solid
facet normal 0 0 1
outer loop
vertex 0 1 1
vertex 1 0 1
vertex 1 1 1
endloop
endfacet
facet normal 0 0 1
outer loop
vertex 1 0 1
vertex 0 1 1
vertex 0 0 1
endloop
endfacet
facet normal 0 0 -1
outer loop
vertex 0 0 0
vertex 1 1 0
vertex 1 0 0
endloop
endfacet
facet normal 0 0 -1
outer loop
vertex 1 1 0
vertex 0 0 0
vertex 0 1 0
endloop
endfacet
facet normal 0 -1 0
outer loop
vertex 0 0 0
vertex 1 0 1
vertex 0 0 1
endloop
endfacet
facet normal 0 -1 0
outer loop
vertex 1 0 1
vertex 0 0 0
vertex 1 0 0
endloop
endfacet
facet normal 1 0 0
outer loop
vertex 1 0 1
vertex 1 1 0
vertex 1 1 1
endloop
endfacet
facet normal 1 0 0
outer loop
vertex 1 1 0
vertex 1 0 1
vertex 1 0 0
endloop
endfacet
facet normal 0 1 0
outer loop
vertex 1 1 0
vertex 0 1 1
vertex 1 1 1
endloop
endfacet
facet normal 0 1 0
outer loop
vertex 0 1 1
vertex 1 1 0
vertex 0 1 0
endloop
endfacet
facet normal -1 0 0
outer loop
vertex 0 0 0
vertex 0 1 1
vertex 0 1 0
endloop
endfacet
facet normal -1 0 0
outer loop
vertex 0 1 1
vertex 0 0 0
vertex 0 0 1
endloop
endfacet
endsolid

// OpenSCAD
// file: ../util.scad
//=============================================================================
// Common utilities for lock models
//=============================================================================

// Resolution defaults

$fs = 0.1;
$fa = 1;

eps = 1e-3;

//-----------------------------------------------------------------------------
// Extruding
//-----------------------------------------------------------------------------

module linear_extrude_y(height,center=false,convexity=4) {
  translate([0,center?0:height,0])
  rotate([90,0,0])
  linear_extrude(height=height,center=center,convexity=convexity) children();
}
module linear_extrude_x(height,center=false,convexity=4) {
  rotate([0,0,90])
  linear_extrude_y(height=height,center=center,convexity=convexity) children();
}

//-----------------------------------------------------------------------------
// Chamfering
//-----------------------------------------------------------------------------

module fillet(r) {
  offset(r=r) offset(delta=-r) children();
}

module chamfer_rect(w,h,r) {
  polygon([
    [-w/2+r,-h/2],
    [-w/2,-h/2+r],
    [-w/2,h/2-r],
    [-w/2+r,h/2],
    [w/2-r,h/2],
    [w/2,h/2-r],
    [w/2,-h/2+r],
    [w/2-r,-h/2],
  ]);
}

module octahedron(r) {
  union() {
    cylinder(r1=r,r2=0,h=r,$fn=4);
    mirror([0,0,1]) cylinder(r1=r,r2=0,h=r,$fn=4);
  }
}

module chamfer_cube(x,y,z,r) {
  minkowski() {
    cube([x-2*r,y-2*r,z-2*r],center=true);
    octahedron(r,center=true);
  }
}

module minkowski_difference(size=1e12) {
  difference() {
    cube(size*[1.1,1.1,1.1], center=true);
    minkowski(){
      difference(){
        cube(size*[1,1,1], center=true);
        children(0);
      }
      children(1);
    }
  }
}

//-----------------------------------------------------------------------------
// Primitives
//-----------------------------------------------------------------------------

function mul_vec(a,b) = [for (i=[0:len(a)-1]) a[i]*b[i]];
function reverse(list) = [for (i=[0:len(list)-1]) list[len(list)-i-1]];
function mul_vecs(a,list) = [for (x=list) mul_vec(a,x)];
function palindrome(mul, list) = concat(list, mul_vecs(mul,reverse(list)));
module sym_polygon(mul,list) {
  polygon(palindrome(mul,list));
}
// a polygon that is symmetric in the y direction
module sym_polygon_y(list) sym_polygon([1,-1],list);
module sym_polygon_x(list) sym_polygon([-1,1],list);
module sym_polygon_xy(list) {
  polygon(concat(
    list,
    mul_vecs([1,-1],reverse(list)),
    mul_vecs([-1,-1],list),
    mul_vecs([-1,1],reverse(list))
  ));
}
module sym_polygon_180(list) {
  polygon(concat(list,mul_vecs([-1,-1],list)));
}

//-----------------------------------------------------------------------------
// Halfspaces
//-----------------------------------------------------------------------------

lots = 1e3;
module positive_x() { translate([lots,0,0]) cube(2*lots,true); }
module positive_y() { translate([0,lots,0]) cube(2*lots,true); }
module positive_z() { translate([0,0,lots]) cube(2*lots,true); }
module negative_x() { translate([-lots,0,0]) cube(2*lots,true); }
module negative_y() { translate([0,-lots,0]) cube(2*lots,true); }
module negative_z() { translate([0,0,-lots]) cube(2*lots,true); }
module everything() { cube(2*lots,true); }
module not() { difference() { group() {children();} everything(); }  }

//-----------------------------------------------------------------------------
// Other construction utilities
//-----------------------------------------------------------------------------

module translate_x(d) { translate([d,0,0]) children(); }
module translate_y(d) { translate([0,d,0]) children(); }
module translate_z(d) { translate([0,0,d]) children(); }

module translates(ps) {
  for (p=ps) translate(p) children();
}

module mirrored(a) {
  children();
  mirror(a) children();
}

//-----------------------------------------------------------------------------
// Threads
//-----------------------------------------------------------------------------

module m3_thread(length,internal=false) metric_thread(diameter=3,pitch=0.5,length=length,internal=internal);
module m4_thread(length,internal=false) metric_thread(diameter=4,pitch=0.7,length=length,internal=internal);

//-----------------------------------------------------------------------------
// Twisting
//-----------------------------------------------------------------------------
// main file
//=============================================================================
// Waverlock: a wavy waferlock
// by Twan van Laarhoven
//=============================================================================

include <../util.scad>

//-----------------------------------------------------------------------------
// Model parameters
//-----------------------------------------------------------------------------

//bitting = [-2,-3,-1,1,3,3,2];
bitting = [-2,-3,-1,-3,-1,1,3,3,2];
//bitting = [-2,-3,-1,1,3,3,1,-1,-3,1];
//bitting = [-2,-3,-2,-1,1,3,3,2,0,-2];
echo("key bitting", bitting);

eps = 0.01;
C = 0.125; // clearance
CX = 0.125; // clearance in x and y directions
tightC = 0.08;
bridgeC = 0.5; // clearance for bridges

coreR = 9;

//wafers = 12;
wafers = len(bitting);
echo("nr wafers", wafers);
waferThickness = 2;
waferThicknessLast = 4;
waferStep = waferThickness+C;
waferWidth = 10;
waferLip = 0.6;
tabWidth = 8;
tabSlope = 0.3;

faceR = coreR+1;
faceThickness = 2;
faceCountersink = 1;

keyWidth = 7;
keyDelta = 2;
keyHeight = 1.8;

toothSlope = 1;
keyC = C + 0.05; // vertical clearance in keyhole
keyCX = 0.2; // horizontal clearance in keyhole (not critical)
keyHolePos = 0;

connectorR=1.25;
connectorPos=0;
connectorLen=6;
pinC = 0.2; // it is critical that there is enough clearance, better to have too much
pinCX = 0.05; // clearance in movement direction

step = 0.8;
//step = 0.8;
//step = 1.0;
//minBit = -6; maxBit = 6;
//minBit = -4; maxBit = 4;
minBit = -3; maxBit = 3;
//minBit = -2; maxBit = 4;
//minBit = -1; maxBit = 5;
//minBit = 0; maxBit = 6;
bits = maxBit-minBit+1;
//maxDelta = 3*step;
maxDelta = 1.6;

tabC = 0.4; // Clearance on side of tabs
tabCtwist = 3; // extra clearance on back wafers
tabCY = 2*C; // Clearance above tabs
tabR = coreR + (bits-1)*step + tabCY;

coreBack = 2;
clipSep = 0.8;
coreBackOverlap = 1;
coreStackHeight = wafers * waferStep + waferThicknessLast + bridgeC - coreBackOverlap;

echo ("bit difference",bits*step);
waferSpace=bits*step + 0.5;
housingRX = coreR + 4;
housingRY = coreR + 1.7 + waferSpace;
housingChamfer = 1;
coreHeight = faceCountersink + coreStackHeight;
housingDepth = coreHeight + coreBack + clipSep;
echo ("housing",2*housingRX,2*housingRY,housingDepth);

housingChamfer2 = housingChamfer*0.5; // chamfer inside cap
capEdge = 1.6;
capCountersink = 1.6;
capDepth = capEdge+capCountersink+1+6;
capClip = 1;
capClipLength = 10;

clipR = housingRX-capEdge-(C+tightC); // better a bit extra play here
clipW = 8;
clipCoreR = coreR-2;
clipCoreC = 0.05;
clipH = 4.4;

//-----------------------------------------------------------------------------
// Keyway
//-----------------------------------------------------------------------------

module key_profile(delta=0) {
  dx=2*delta*keyDelta/keyWidth;
  dy=delta;
  linear_extrude(height=eps,convexity=106) {
    rotate(90)
    polygon([
      [-keyDelta/2-dx,-keyWidth/2-dy],
      [keyDelta/2,0],
      [-keyDelta/2-dx,keyWidth/2+dy],
      [-keyDelta/2-dx+eps,keyWidth/2+dy],
      [keyDelta/2+eps,0],
      [-keyDelta/2-dx+eps,-keyWidth/2-dy]
    ]);
  }
}
module extrude_key(delta=0) {
  minkowski() {
    linear_extrude_x(eps) children();
    key_profile(delta);
  }
}
module key_hole(delta=keyCX) {
  l=0;
  extrude_key(delta=delta) {
    sym_polygon_x([
      [keyHeight/2+keyC+toothSlope*(1+l), -l],
      [keyHeight/2+keyC+toothSlope*0,    1],
      [keyHeight/2+keyC+toothSlope*0,    1.5],
      [keyHeight/2+keyC+toothSlope*0.5,  2],
    ]);
  }
}
module last_key_hole(delta=keyCX) {
  l = 10; r = 10;
  extrude_key(delta=delta) {
    sym_polygon_x([
      [keyHeight/2+keyC+toothSlope*l, -l],
      [keyHeight/2+keyC+toothSlope*0, 0],
      [keyHeight/2+keyC+toothSlope*0, r],
    ]);
  }
}
//!key_hole();

//-----------------------------------------------------------------------------
// Key
//-----------------------------------------------------------------------------

module key_shape() {
  ebitting = concat([0],bitting,[0]);
  n = len(ebitting);
  point = 0.3;
  flat = 0.2;
  coflat = 0.1;
  end = (n-1)*waferStep + waferThicknessLast - 0.5;
  top = concat(
    [[-keyHeight/2, 0]],
    [for (i=[0:n-1]) for (j=[0,1])
      [ebitting[i]*step - keyHeight/2, i*waferStep +
        (j==0 ? ((i>0   && ebitting[i-1]<ebitting[i]) ? 1-flat : 1+coflat)
              : ((i+1<n && ebitting[i+1]<ebitting[i]) ? 1.5+flat : 1.5-coflat))]
    ],
    [[-keyHeight/2, end - (keyHeight-point)/2]
    ,[-point/2, end]]
  );
  bot = concat(
    [[keyHeight/2, 0]],
    [for (i=[0:n-1]) for (j=[0,1])
      [ebitting[i]*step + keyHeight/2, i*waferStep +
        (j==0 ? ((i>0   && ebitting[i-1]>ebitting[i]) ? 1-flat : 1+coflat)
              : ((i+1<n && ebitting[i+1]>ebitting[i]) ? 1.5+flat : 1.5-coflat))]
    ],
    [[keyHeight/2, end - (keyHeight-point)/2]
    ,[point/2, end]]
  );
  polygon(concat(top,reverse(bot)));
}
module key() {
  end = (len(bitting)+1)*waferStep + waferThicknessLast - 0.5;
  chamfer = 0.7;
  group() {
    intersection() {
      extrude_key() {
        key_shape();
      }
      linear_extrude_y(lots,true) {
        sym_polygon_x([[-keyWidth,-10], [-keyWidth,end-chamfer], [-keyWidth/2,end-chamfer], [-keyWidth/2+chamfer,end]]);
      }
    }
    extrude_key() {
      polygon([[-keyHeight/2,0],[keyHeight/2,0],[0,-4]]);
      //translate([-keyHeight/2,-2]) square([keyHeight,2]);
    }
    linear_extrude_y(2,true) {
      difference() {
        translate([0,-16/2]) chamfer_rect(16,16,4);
        translate([0,-16/2-4]) chamfer_rect(5,5,2.5);
      }
    }
  }
}
//!key();

module key_stack(color = "darkred", offset=0) {
  translate_y(1) color(color) linear_extrude_x(1,true) key_shape();
  //color(color) key();
  n = len(bitting);
  translate_z(offset+C)
  intersection() {
    group() {
      first_wafer();
      for (i=[0:n-1]) {
        a = offset/waferStep;
        p = (1-a)*bitting[i] + a*(i==n-1 ? 0 : bitting[i+1]);
        translate([0,(p-bitting[i])*step,faceThickness + i*waferStep])
        if (i==0) {
          wafer(bitting[i]);
        } else {
          wafer(bitting[i]);
        }
      }
      translate_z(faceThickness + n*waferStep) last_wafer();
    }
    negative_x();
  }
}
module key_stacks() {
  key_stack();
  translate_y(coreR*2+8) key_stack(color="darkblue",offset=waferStep*0.5);
}

//!key_stacks();

//-----------------------------------------------------------------------------
// Wafer connector pins
//-----------------------------------------------------------------------------

//module connector_halfpin(C=0) cylinder(r=3+C,h=1);
//module connector_halfpin(C=0) cube([2+2*C,6+2*C,2],true);
module connector_halfpin(C=0,CX=0,dh=0) {
  a = 1.2;
  h = 1.2-dh;
  linear_extrude_y(connectorLen+2*CX,true) {
    //sym_polygon_x([[-a-C, 0], [-a-C+h,h]]);
    sym_polygon_x([[-a-C, 0], [-a+h,h+C]]);
  }
}

module connector_pin(C=0) {
  if (false) {
    union() {
      cylinder(r=connectorR+C,h=1-0.2);
      cylinder(r1=connectorR+0.2+C,r2=connectorR+C,h=0.2);
      translate([0,0,1-0.2]) cylinder(r1=connectorR+C,r2=connectorR-0.2+C,h=0.2);
    }
  } else {
    group() {
      translate([0,coreR,0]) connector_halfpin(dh=0.2);
      translate([0,-coreR,0]) connector_halfpin(dh=0.2);
    }
  }
}

module connector_slot(bit=3) {
  a = -maxDelta;
  b = maxDelta;
  if (true) {
    group() {
      hull() {
        translate([0,coreR+a,0]) connector_halfpin(pinC,CX=pinCX);
        translate([0,coreR+b,0]) connector_halfpin(pinC,CX=pinCX);
      }
      hull() {
        translate([0,-coreR+a,0]) connector_halfpin(pinC,CX=pinCX);
        translate([0,-coreR+b,0]) connector_halfpin(pinC,CX=pinCX);
      }
    }
  } else {
    hull() {
      translate([0,a,0]) cylinder(r=connectorR+C,h=1);
      translate([0,b,0]) cylinder(r=connectorR+C,h=1);
    }
    hull() {
      translate([0,a,0]) cylinder(r1=connectorR+0.2+C,r2=connectorR+C,h=0.2);
      translate([0,b,0]) cylinder(r1=connectorR+0.2+C,r2=connectorR+C,h=0.2);
    }
  }
}

//-----------------------------------------------------------------------------
// Wafers
//-----------------------------------------------------------------------------

module wafer_profile(C=0,CX=0) {
  a = waferLip + 2*C;
  b = a + waferLip;
  linear_extrude_y(coreR*2+eps,center=true,convexity=2)
  sym_polygon_x([
    [-waferWidth/2-CX-waferLip,0],
    [-waferWidth/2-CX-waferLip,a],
    [-waferWidth/2-CX,b],
    [-waferWidth/2-CX,waferThickness+C]
  ]);
}
module last_wafer_profile(C=0,CX=0,bridgeC=0) {
  thickness = waferThicknessLast;
  a = waferLip + 2*C;
  w = thickness+C-a-waferLip;
  linear_extrude_y(coreR*2+eps,center=true,convexity=2)
  sym_polygon_x([
    [-waferWidth/2-CX-waferLip,0],
    [-waferWidth/2-CX-waferLip,a],
    [-waferWidth/2-CX+w+bridgeC,thickness+C+bridgeC]
  ]);
}

module wafer_profiles(C=C,CX=CX) {
  for (i = [0:wafers-1]) {
    translate([0,0,i*waferStep]) {
      wafer_profile(C+eps,CX=CX);
    }
  }
  translate([0,0,wafers*waferStep]) {
    last_wafer_profile(C+eps,CX=CX,bridgeC=bridgeC);
  }
}
module tab_profile(width=tabWidth,height=2*coreR) {
  x = width/2 - tabSlope*height/2;
  polygon([
    [-width/2,-height/2],
    [-x,0],
    [-width/2,height/2],
    [width/2,height/2],
    [x,0],
    [width/2,-height/2],
  ]);
}
//!linear_extrude(waferThickness,true) tab_profile();
//connectorR=2;connectorO=[0,0,-0.5];

module wafer(bit, minBit=minBit, maxBit=maxBit, slot=true, pin=true, tabs=true) {
  y = bit*step;
  thickness = waferThickness;
  difference() {
    union() {
      // tabs
      if (tabs) intersection() {
        linear_extrude(thickness) tab_profile();
        cylinder(r=coreR,h=thickness);
      }
      // profile
      intersection() {
        wafer_profile();
        translate([0,y-maxBit*step,0]) cylinder(r=coreR,h=thickness);
        translate([0,y-minBit*step,0]) cylinder(r=coreR,h=thickness);
      }
      // connector
      if (pin) {
        intersection() {
          translate([0,y+connectorPos,waferThickness]) connector_pin();
          if (tabs) {
            cylinder(r=coreR,h=thickness+2);
          } else {
            intersection() {
              translate([0,y-maxBit*step,0]) cylinder(r=coreR,h=thickness+2);
              translate([0,y-minBit*step,0]) cylinder(r=coreR,h=thickness+2);
            }
          }
        }
      }
    }
    translate([0,y+keyHolePos,-eps/2])
      key_hole();
    // connectorSlot
    if (slot) {
      translate([0,y+connectorPos,-eps]) connector_slot(bit);
    }
  }
  //translate([2,y+connectorPos,waferThickness/2]) connector_slot(bit);
}

module first_wafer(bit=0) {
  wafer(0,minBit=max(minBit,-maxDelta/step),maxBit=min(maxBit,maxDelta/step),slot=false,tabs=false);
}

module last_wafer(bit=0) {
  thickness = waferThicknessLast;
  y = 0;
  difference() {
    intersection() {
      last_wafer_profile();
      union() {
        // note: we might run into the core back chamfer
        ch = max(0,coreBackOverlap + C - bridgeC);
        cylinder(r=coreR,h=thickness-ch);
        translate_z(thickness-ch) cylinder(r1=coreR,r2=coreR-ch,h=ch);
      }
    }
    translate([0,y+keyHolePos,1-eps/2]) last_key_hole();
    translate([0,y+connectorPos,-eps]) connector_slot(bit);
  }
}

//Tests
module wafers() {
  wafer(minBit);
  //translate([0,0,3]) wafer(minBit+3);
  //translate([0,0,3]) wafer(maxBit);
  //translate([0,0,2]) wafer(4);
  translate([20,0,0]) wafer(0);
  translate([40,0,0]) wafer(maxBit);
  translate([60,0,0]) first_wafer();
  translate([80,0,0]) last_wafer();
  translate([-20,0,0]) wafer(minBit+1);
}
module waferTest() {
  intersection() {
    group() {
      wafer(minBit);
      color("lightgreen") translate([0,-6*step,2+C]) wafer(minBit+3);
      //color("lightgreen") translate([0,-0*step,2+C]) wafer(minBit+3);
      color("pink") translate([0,-6*step,2*waferStep]) wafer(maxBit);
      color("lightyellow") translate([0,0*step,3*waferStep]) wafer(maxBit-3);
      color("lightyellow") translate([0,6*step,4*waferStep]) wafer(minBit);
    }
    //translate([50,0,0]) cube([100,100,100],center=true);
    translate([1,0,0]) cube([2,100,100],center=true);
  }
}
//!waferTest();
//!wafers();

//-----------------------------------------------------------------------------
// Core
//-----------------------------------------------------------------------------

module face_plate() {
  sideChamfer = 0.5;
  difference() {
    rotate_extrude() {
      polygon([[0,faceThickness],[0,0],[faceR-1,0],[faceR,1],[faceR,faceThickness]]);
    }
    translate([0,keyHolePos,-eps/2]) {
      key_hole();
      // chamfer sides
      intersection() {
        key_hole(delta=keyCX+sideChamfer);
        w=(keyWidth+2*sideChamfer)/sqrt(2);
        rotate([0,45,0]) cube([w,10,w],center=true);
      }
    }
  }
}

module core(C=C,CX=C) {
  union() {
    face_plate();
    translate([0,0,faceThickness])
    intersection() {
      difference() {
        union() {
          cylinder(r=coreR,h=coreStackHeight);
          translate_z(coreStackHeight) cylinder(r1=coreR,r2=coreR-coreBack,h=coreBack);
          translate_z(coreStackHeight+coreBack) cylinder(r=clipCoreR,h=clipH+clipSep+C);
        }
        // slots for wafers
        translate([0,0,-eps])
        wafer_profiles(C=C,CX=CX);
        // chamfer for wafer slots
        ww = waferWidth/2 + waferLip + CX;
        y = sqrt(coreR*coreR-ww*ww); // where wafer slots end
        h = wafers * waferStep + C-2*eps;
        chamfer = 0.5;
        translate([0,-y-chamfer,0])cube([2*coreR,2*chamfer,2*h],center=true);
        translate([0,y+chamfer,0])cube([2*coreR,2*chamfer,2*h],center=true);
        // top chamfer for printability
        if (false) {
          //h2 = wafers * waferStep -2*eps + waferLip;
          h2 = coreStackHeight + bridgeC + C;
          ww2 = waferWidth/2 + waferLip + waferLip - waferThicknessLast + C*2 - bridgeC;
          y2 = sqrt(coreR*coreR-ww2*ww2);
          linear_extrude_x(2*coreR,true) {
            mirrored([1,0,0])
            polygon([[y2,h2],[y2+10,h2+10],[y2+10,h2]]);
          }
        }
        // slot for retaining clip
        translate_z(coreStackHeight+coreBack+clipSep+C)
          linear_extrude_x(2*coreR,true) retaining_clip_profile(C=tightC,bridgeC=bridgeC);
      }
    }
  }
};
//!core();

//-----------------------------------------------------------------------------
// Retaining clip
//-----------------------------------------------------------------------------

module retaining_clip_profile(C=0,bridgeC=0) {
  h = 2 + bridgeC;
  sym_polygon_x([[clipW/2+C,0], [clipW/2+C,waferLip], [clipW/2+C-h,h+waferLip]]);
}
module retaining_clip_connector(clip=true) {
  e = clip ? 0 : tightC;
  if (clip)
  intersection() {
    linear_extrude_y(2*clipR+2,true) {
      retaining_clip_profile();
    }
    cylinder(r=clipCoreR+clipCoreC,h=clipH);
    // snap connector
    linear_extrude(clipH,convexity=10) {
      pinR = 0.5;
      pos = clipCoreR+clipCoreC-3;
      difference() {
        union() {
          translate([0,-clipR]) square([10,2*clipR]);
          translate([0,pos]) circle(r=pinR);
        }
        translate([0,-pos]) circle(r=pinR+0.1);
        slot = pos*1.0;
        translate([0.8,0]) square([pinR,slot+pinR]);
        translate([0,slot+pinR]) square([0.8+pinR,0.2]);
      }
    }
  }
  difference() {
    union() {
      intersection() {
        linear_extrude_y(2*clipR+2,true) {
          xLip= clip ? 0.3 : 0;
          w = 2.3;
          polygon([[w+e,0],[w+e,waferLip],[xLip,w+e+waferLip-xLip],[0,w+e+waferLip-xLip],[0,0]]);
        }
        difference() {
          cylinder(r=clipR-1+e,h=clipH);
          cylinder(r=clipCoreR+clipCoreC-eps,h=clipH);
        }
        //cylinder(r=clipR-1,h=clipH);
      }
    }
  }
  s = clipH*0.4 + e/2;
  translate([-(clipR+clipCoreR+clipCoreC)/2,-eps,clipH/2])
  rotate([-90]) cylinder(r1=s,r2=0,h=s,$fn=7);
}
module retaining_clip_ring() {
  union() {
    //cylinder(r=clipR,h=clipH);
    d = 1.1;
    lip = waferLip;
    a = (clipH-2*d-lip)/2;
    cylinder(r=clipR-d,h=clipH);
    cylinder(r=clipR,h=a);
    translate_z(a) cylinder(r1=clipR,r2=clipR-d,h=d);
    intersection() {
      union() {
        translate_z(clipH-a-d) cylinder(r1=clipR-d,r2=clipR,h=d);
        translate_z(clipH-a) cylinder(r=clipR,h=a);
      }
      cube([2*clipR-3*d,100,100],true);
    }
  }
}
module retaining_clip() {
  difference() {
    union() {
      difference() {
        retaining_clip_ring();
        translate_z(-eps) cylinder(r=clipCoreR+clipCoreC,h=clipH+2*eps);
        positive_y();
      }
      intersection() {
        retaining_clip_connector(true);
        retaining_clip_ring();
      }
    }
    rotate(180) retaining_clip_connector(false);
  }
}
module retaining_clip_test() {
  retaining_clip();
  translate([0,0,0.0]) color("pink") rotate(180) retaining_clip();
}
//!retaining_clip();
//!retaining_clip_test();

//-----------------------------------------------------------------------------
// Housing
//-----------------------------------------------------------------------------

module housing_tabslot(tabC=0.5) {
  intersection() {
    tab_profile(height=2*tabR, width=tabWidth+2*(tabR-coreR)*tabSlope + tabC);
    circle(tabR);
  }
}

module housing() {
  faceC=0.2; // extra space because of supports used
  difference() {
    /*
    linear_extrude(housingHeight) {
      //square([2*housingR,2*housingR+3],center=true);
      /*hull() {
        translate([0,-waferSpace,0]) circle(housingR);
        translate([0,waferSpace,0]) circle(housingR);
      }* /
      //fillet(10) square([2*housingR,2*housingR+waferSpace],center=true);
      chamfer_rect(2*housingR,2*housingR+waferSpace,1);
    }*/
    translate([0,0,housingDepth/2])
    chamfer_cube(2*housingRX,2*housingRY,housingDepth,housingChamfer);
    
    // core
    //translate([0,0,-eps]) cylinder(r=coreR+C,h=housingDepth+2*eps);
    translate([0,0,-eps]) cylinder(r=coreR+C,h=coreHeight+2*eps);
    translate([0,0,coreHeight]) cylinder(r1=coreR+C,r2=coreR+C-coreBack,h=coreBack);
    translate([0,0,coreHeight+coreBack]) cylinder(r=clipCoreR+C,h=coreBack);
    // face
    translate([0,0,-eps]) cylinder(r=faceR+C,h=faceCountersink+faceC+2*eps);
    // tab slots
    // Note: slightly wider slots towards the front, to make back wafers bind first
    // Note: first wafer is an alignment wafers, and doesn't need tab slots, but include a half slot for some clearance
    // Note: for printability of bridges, we add 2mm
    h = waferStep*wafers+C + 2;
    for (twist=[-tabCtwist,tabCtwist])
    translate([0,0,faceCountersink+1-C])
      linear_extrude(h, twist=twist, slices=4*wafers, convexity=10) {
      housing_tabslot(tabC);
    }
    // ledge for cap
    w = capEdge + tightC;
    translate_z(housingDepth-capCountersink) difference() {
      positive_z();
      chamfer_cube(2*housingRX-2*w,2*housingRY-2*w,100,housingChamfer2+0.1+C);
    }
  }
}
//!housing();

module housing_back() {
  w = 1;
  intersection() {
    difference() {
      chamfer_cube(2*housingRX,2*housingRY,2*capDepth,housingChamfer);
      chamfer_cube(2*housingRX-2*capEdge,2*housingRY-2*capEdge,2*(capDepth-capEdge),housingChamfer2);
    }
    positive_z();
  }
  lip = waferLip;
  mirrored([1,0,0])
  translate([housingRX-capEdge,0,capCountersink+clipH/2])
  linear_extrude_y(capClipLength,true) {
    polygon([[0,-capClip-lip/2],[-capClip,-lip/2],[-capClip,lip/2],[0,capClip+lip/2]]);
  }
  translate([-5,0,capDepth-capEdge]) rotate([180]) rotate(90) linear_extrude(1)
  text("waverlock",size=4.5,font="ubuntu",halign="center",valign="center");
  translate([5,0,capDepth-capEdge]) rotate([180]) rotate(90) linear_extrude(1)
  text("by twanvl",size=4.5,font="ubuntu",halign="center",valign="center");
}
//!housing_back();

module exposed_housing() {
  difference() {
    housing();
    w=8;h=8;
    d = lots;
    translate([-lots/2,-w/2,2.5]) cube([lots,w,d]);
    translate([-h/2,-lots/2,2.5]) cube([h,lots,d]);
  }
}

//-----------------------------------------------------------------------------
// Tests
//-----------------------------------------------------------------------------

//color("grey") translate([0,0,faceThickness-1]) housing();


//core();
//intersection() {core(); cube(2*32,true);}

module test() {
  $fn=20;
  exposed=1;
  showHousing=1;
  showCore=0;
  showWafers=1;
  intersection() {
    group() {
      if (showHousing) translate([0,0,1]) color("white")
        if (exposed) exposed_housing(); else housing();
      rotate(0) {
        if (showCore) {
          translate([0,0,0]) color("pink") core();
        }
        if (showWafers) {
          translate([0,0,faceThickness+C/2]) color("lightgreen") first_wafer();
          translate([0,0,faceThickness+waferStep+C/2]) color("lightblue") wafer(0);
          translate([0,0,faceThickness+wafers*waferStep+C/2]) color("lightyellow") last_wafer();
        }
        translate([0,0,faceThickness+coreStackHeight+coreBack+clipSep+C+tightC/2]) rotate(90) color("lightgreen") retaining_clip();
      }
      if (showHousing) translate([0,0,1+housingDepth-capCountersink+tightC]) color("lightblue") housing_back();
    }
    positive_y();
    //translate_y(3) negative_y();
  }
}
//!test();
//!export_needed_wafers();
!export_everything();

if (false) {
translate([0,step*3,faceThickness+waferThickness/2+C/2]) color("red") wafer(minBit+3);
translate([0,step*6,faceThickness+waferThickness/2+C/2+waferStep]) color("red") wafer(minBit+0);
translate([0,-step*6,faceThickness+waferThickness/2+C/2+waferStep*2]) color("blue") wafer(minBit+6);
translate([0,-step*0,faceThickness+waferThickness/2+C/2+waferStep*3]) color("green") wafer(minBit+6);
translate([0,step*1,faceThickness+waferThickness/2+C/2+waferStep*4]) color("limegreen") wafer(minBit+5);
}

module labled_core(CX,label) {
  lbl = label==undef ? str(CX) : label;
  core(CX=CX);
  stackHeight = wafers * waferStep + waferThicknessLast;
  translate([0,0,faceThickness + coreStackHeight + coreBack + clipSep + clipH]) linear_extrude(0.2)
    text(lbl,size=5,font="Ubuntu",halign="center",valign="center");
}
!labled_core(CX=CX);
 
module housing_test(CX,label) {
  housingHeight = 4;
  housingR = coreR+2.5;
  faceCountersink=1;
  d = 5;
  lbl = label==undef ? str(CX) : label;
  difference() {
    translate([0,d/2,housingHeight/2])
    chamfer_cube(2*housingR,2*housingR+d,housingHeight,1);
    // core
    translate([0,0,-eps]) cylinder(r=coreR+CX,h=housingHeight+2*eps);
    // face
    translate([0,0,-eps]) cylinder(r=faceR+CX,h=faceCountersink+2*eps);
    translate([0,0,housingHeight-faceCountersink]) cylinder(r=faceR+CX,h=faceCountersink+2*eps);
    // label
    translate([0,housingR+d/2-1.2,housingHeight-0.2]) linear_extrude(0.2+eps)
      text(lbl,size=5,font="Ubuntu",halign="center",valign="center");
  }
  //translate([0,housingR+d/2-1.5,housingHeight]) linear_extrude(0.2)
  //  text(lbl,size=5,font="Ubuntu",halign="center",valign="center");
}
//!housing_test(0);
 
//-----------------------------------------------------------------------------
// Export
//-----------------------------------------------------------------------------

module export_wafer0() { wafer(minBit+0); }
module export_wafer1() { wafer(minBit+1); }
module export_wafer2() { wafer(minBit+2); }
module export_wafer3() { wafer(minBit+3); }
module export_wafer4() { wafer(minBit+4); }
module export_wafer5() { wafer(minBit+5); }
module export_wafer6() { wafer(minBit+6); }
module export_first_wafer() { first_wafer(); }
module export_last_wafer() { last_wafer(); }

module export_all_wafers(copies = 2) {
  for (j=[0:copies-1]) {
    translate_y(j*(coreR*2+6))
    for (i=[minBit:maxBit]) {
      translate_x(i*(waferWidth+6)) wafer(i);
    }
  }
  translate_x((minBit-1)*(waferWidth+6)) first_wafer();
  translate_x((maxBit+1)*(waferWidth+6)) last_wafer();
}
module export_needed_wafers() {
  for (i=[0:wafers]) {
    translate_x(i*(waferWidth+6))
    if (i==0) {
      first_wafer();
    } else if (i==wafers) {
      last_wafer();
    } else {
      wafer(bitting[i]);
    }
  }
}

module export_core() { core(); }
module export_housing() { housing(); }
module export_exposed_housing() { exposed_housing(); }
module export_retaining_clip() { retaining_clip(); }
module export_cap() { rotate([180,0,0]) housing_back(); }
module export_key() { key(); }

module export_everything() {
  if (0) {
    translate([-wafers/2*(waferWidth+6),coreR+housingRY+8]) export_needed_wafers();
    translate([-2*housingRX-8,0]) export_core();
    translate([0,0]) export_housing();
    translate([2*housingRX+8,0,capDepth]) export_cap();
    translate([2*(2*housingRX+8),coreR,0]) export_retaining_clip();
    translate([-2*(2*housingRX+8),coreR,0]) export_retaining_clip();
    translate([0,-2*housingRY,0]) export_key();
  } else {
    //!extrude_key(){circle(1,$fn=1);};
    cube(1);
  }
}
